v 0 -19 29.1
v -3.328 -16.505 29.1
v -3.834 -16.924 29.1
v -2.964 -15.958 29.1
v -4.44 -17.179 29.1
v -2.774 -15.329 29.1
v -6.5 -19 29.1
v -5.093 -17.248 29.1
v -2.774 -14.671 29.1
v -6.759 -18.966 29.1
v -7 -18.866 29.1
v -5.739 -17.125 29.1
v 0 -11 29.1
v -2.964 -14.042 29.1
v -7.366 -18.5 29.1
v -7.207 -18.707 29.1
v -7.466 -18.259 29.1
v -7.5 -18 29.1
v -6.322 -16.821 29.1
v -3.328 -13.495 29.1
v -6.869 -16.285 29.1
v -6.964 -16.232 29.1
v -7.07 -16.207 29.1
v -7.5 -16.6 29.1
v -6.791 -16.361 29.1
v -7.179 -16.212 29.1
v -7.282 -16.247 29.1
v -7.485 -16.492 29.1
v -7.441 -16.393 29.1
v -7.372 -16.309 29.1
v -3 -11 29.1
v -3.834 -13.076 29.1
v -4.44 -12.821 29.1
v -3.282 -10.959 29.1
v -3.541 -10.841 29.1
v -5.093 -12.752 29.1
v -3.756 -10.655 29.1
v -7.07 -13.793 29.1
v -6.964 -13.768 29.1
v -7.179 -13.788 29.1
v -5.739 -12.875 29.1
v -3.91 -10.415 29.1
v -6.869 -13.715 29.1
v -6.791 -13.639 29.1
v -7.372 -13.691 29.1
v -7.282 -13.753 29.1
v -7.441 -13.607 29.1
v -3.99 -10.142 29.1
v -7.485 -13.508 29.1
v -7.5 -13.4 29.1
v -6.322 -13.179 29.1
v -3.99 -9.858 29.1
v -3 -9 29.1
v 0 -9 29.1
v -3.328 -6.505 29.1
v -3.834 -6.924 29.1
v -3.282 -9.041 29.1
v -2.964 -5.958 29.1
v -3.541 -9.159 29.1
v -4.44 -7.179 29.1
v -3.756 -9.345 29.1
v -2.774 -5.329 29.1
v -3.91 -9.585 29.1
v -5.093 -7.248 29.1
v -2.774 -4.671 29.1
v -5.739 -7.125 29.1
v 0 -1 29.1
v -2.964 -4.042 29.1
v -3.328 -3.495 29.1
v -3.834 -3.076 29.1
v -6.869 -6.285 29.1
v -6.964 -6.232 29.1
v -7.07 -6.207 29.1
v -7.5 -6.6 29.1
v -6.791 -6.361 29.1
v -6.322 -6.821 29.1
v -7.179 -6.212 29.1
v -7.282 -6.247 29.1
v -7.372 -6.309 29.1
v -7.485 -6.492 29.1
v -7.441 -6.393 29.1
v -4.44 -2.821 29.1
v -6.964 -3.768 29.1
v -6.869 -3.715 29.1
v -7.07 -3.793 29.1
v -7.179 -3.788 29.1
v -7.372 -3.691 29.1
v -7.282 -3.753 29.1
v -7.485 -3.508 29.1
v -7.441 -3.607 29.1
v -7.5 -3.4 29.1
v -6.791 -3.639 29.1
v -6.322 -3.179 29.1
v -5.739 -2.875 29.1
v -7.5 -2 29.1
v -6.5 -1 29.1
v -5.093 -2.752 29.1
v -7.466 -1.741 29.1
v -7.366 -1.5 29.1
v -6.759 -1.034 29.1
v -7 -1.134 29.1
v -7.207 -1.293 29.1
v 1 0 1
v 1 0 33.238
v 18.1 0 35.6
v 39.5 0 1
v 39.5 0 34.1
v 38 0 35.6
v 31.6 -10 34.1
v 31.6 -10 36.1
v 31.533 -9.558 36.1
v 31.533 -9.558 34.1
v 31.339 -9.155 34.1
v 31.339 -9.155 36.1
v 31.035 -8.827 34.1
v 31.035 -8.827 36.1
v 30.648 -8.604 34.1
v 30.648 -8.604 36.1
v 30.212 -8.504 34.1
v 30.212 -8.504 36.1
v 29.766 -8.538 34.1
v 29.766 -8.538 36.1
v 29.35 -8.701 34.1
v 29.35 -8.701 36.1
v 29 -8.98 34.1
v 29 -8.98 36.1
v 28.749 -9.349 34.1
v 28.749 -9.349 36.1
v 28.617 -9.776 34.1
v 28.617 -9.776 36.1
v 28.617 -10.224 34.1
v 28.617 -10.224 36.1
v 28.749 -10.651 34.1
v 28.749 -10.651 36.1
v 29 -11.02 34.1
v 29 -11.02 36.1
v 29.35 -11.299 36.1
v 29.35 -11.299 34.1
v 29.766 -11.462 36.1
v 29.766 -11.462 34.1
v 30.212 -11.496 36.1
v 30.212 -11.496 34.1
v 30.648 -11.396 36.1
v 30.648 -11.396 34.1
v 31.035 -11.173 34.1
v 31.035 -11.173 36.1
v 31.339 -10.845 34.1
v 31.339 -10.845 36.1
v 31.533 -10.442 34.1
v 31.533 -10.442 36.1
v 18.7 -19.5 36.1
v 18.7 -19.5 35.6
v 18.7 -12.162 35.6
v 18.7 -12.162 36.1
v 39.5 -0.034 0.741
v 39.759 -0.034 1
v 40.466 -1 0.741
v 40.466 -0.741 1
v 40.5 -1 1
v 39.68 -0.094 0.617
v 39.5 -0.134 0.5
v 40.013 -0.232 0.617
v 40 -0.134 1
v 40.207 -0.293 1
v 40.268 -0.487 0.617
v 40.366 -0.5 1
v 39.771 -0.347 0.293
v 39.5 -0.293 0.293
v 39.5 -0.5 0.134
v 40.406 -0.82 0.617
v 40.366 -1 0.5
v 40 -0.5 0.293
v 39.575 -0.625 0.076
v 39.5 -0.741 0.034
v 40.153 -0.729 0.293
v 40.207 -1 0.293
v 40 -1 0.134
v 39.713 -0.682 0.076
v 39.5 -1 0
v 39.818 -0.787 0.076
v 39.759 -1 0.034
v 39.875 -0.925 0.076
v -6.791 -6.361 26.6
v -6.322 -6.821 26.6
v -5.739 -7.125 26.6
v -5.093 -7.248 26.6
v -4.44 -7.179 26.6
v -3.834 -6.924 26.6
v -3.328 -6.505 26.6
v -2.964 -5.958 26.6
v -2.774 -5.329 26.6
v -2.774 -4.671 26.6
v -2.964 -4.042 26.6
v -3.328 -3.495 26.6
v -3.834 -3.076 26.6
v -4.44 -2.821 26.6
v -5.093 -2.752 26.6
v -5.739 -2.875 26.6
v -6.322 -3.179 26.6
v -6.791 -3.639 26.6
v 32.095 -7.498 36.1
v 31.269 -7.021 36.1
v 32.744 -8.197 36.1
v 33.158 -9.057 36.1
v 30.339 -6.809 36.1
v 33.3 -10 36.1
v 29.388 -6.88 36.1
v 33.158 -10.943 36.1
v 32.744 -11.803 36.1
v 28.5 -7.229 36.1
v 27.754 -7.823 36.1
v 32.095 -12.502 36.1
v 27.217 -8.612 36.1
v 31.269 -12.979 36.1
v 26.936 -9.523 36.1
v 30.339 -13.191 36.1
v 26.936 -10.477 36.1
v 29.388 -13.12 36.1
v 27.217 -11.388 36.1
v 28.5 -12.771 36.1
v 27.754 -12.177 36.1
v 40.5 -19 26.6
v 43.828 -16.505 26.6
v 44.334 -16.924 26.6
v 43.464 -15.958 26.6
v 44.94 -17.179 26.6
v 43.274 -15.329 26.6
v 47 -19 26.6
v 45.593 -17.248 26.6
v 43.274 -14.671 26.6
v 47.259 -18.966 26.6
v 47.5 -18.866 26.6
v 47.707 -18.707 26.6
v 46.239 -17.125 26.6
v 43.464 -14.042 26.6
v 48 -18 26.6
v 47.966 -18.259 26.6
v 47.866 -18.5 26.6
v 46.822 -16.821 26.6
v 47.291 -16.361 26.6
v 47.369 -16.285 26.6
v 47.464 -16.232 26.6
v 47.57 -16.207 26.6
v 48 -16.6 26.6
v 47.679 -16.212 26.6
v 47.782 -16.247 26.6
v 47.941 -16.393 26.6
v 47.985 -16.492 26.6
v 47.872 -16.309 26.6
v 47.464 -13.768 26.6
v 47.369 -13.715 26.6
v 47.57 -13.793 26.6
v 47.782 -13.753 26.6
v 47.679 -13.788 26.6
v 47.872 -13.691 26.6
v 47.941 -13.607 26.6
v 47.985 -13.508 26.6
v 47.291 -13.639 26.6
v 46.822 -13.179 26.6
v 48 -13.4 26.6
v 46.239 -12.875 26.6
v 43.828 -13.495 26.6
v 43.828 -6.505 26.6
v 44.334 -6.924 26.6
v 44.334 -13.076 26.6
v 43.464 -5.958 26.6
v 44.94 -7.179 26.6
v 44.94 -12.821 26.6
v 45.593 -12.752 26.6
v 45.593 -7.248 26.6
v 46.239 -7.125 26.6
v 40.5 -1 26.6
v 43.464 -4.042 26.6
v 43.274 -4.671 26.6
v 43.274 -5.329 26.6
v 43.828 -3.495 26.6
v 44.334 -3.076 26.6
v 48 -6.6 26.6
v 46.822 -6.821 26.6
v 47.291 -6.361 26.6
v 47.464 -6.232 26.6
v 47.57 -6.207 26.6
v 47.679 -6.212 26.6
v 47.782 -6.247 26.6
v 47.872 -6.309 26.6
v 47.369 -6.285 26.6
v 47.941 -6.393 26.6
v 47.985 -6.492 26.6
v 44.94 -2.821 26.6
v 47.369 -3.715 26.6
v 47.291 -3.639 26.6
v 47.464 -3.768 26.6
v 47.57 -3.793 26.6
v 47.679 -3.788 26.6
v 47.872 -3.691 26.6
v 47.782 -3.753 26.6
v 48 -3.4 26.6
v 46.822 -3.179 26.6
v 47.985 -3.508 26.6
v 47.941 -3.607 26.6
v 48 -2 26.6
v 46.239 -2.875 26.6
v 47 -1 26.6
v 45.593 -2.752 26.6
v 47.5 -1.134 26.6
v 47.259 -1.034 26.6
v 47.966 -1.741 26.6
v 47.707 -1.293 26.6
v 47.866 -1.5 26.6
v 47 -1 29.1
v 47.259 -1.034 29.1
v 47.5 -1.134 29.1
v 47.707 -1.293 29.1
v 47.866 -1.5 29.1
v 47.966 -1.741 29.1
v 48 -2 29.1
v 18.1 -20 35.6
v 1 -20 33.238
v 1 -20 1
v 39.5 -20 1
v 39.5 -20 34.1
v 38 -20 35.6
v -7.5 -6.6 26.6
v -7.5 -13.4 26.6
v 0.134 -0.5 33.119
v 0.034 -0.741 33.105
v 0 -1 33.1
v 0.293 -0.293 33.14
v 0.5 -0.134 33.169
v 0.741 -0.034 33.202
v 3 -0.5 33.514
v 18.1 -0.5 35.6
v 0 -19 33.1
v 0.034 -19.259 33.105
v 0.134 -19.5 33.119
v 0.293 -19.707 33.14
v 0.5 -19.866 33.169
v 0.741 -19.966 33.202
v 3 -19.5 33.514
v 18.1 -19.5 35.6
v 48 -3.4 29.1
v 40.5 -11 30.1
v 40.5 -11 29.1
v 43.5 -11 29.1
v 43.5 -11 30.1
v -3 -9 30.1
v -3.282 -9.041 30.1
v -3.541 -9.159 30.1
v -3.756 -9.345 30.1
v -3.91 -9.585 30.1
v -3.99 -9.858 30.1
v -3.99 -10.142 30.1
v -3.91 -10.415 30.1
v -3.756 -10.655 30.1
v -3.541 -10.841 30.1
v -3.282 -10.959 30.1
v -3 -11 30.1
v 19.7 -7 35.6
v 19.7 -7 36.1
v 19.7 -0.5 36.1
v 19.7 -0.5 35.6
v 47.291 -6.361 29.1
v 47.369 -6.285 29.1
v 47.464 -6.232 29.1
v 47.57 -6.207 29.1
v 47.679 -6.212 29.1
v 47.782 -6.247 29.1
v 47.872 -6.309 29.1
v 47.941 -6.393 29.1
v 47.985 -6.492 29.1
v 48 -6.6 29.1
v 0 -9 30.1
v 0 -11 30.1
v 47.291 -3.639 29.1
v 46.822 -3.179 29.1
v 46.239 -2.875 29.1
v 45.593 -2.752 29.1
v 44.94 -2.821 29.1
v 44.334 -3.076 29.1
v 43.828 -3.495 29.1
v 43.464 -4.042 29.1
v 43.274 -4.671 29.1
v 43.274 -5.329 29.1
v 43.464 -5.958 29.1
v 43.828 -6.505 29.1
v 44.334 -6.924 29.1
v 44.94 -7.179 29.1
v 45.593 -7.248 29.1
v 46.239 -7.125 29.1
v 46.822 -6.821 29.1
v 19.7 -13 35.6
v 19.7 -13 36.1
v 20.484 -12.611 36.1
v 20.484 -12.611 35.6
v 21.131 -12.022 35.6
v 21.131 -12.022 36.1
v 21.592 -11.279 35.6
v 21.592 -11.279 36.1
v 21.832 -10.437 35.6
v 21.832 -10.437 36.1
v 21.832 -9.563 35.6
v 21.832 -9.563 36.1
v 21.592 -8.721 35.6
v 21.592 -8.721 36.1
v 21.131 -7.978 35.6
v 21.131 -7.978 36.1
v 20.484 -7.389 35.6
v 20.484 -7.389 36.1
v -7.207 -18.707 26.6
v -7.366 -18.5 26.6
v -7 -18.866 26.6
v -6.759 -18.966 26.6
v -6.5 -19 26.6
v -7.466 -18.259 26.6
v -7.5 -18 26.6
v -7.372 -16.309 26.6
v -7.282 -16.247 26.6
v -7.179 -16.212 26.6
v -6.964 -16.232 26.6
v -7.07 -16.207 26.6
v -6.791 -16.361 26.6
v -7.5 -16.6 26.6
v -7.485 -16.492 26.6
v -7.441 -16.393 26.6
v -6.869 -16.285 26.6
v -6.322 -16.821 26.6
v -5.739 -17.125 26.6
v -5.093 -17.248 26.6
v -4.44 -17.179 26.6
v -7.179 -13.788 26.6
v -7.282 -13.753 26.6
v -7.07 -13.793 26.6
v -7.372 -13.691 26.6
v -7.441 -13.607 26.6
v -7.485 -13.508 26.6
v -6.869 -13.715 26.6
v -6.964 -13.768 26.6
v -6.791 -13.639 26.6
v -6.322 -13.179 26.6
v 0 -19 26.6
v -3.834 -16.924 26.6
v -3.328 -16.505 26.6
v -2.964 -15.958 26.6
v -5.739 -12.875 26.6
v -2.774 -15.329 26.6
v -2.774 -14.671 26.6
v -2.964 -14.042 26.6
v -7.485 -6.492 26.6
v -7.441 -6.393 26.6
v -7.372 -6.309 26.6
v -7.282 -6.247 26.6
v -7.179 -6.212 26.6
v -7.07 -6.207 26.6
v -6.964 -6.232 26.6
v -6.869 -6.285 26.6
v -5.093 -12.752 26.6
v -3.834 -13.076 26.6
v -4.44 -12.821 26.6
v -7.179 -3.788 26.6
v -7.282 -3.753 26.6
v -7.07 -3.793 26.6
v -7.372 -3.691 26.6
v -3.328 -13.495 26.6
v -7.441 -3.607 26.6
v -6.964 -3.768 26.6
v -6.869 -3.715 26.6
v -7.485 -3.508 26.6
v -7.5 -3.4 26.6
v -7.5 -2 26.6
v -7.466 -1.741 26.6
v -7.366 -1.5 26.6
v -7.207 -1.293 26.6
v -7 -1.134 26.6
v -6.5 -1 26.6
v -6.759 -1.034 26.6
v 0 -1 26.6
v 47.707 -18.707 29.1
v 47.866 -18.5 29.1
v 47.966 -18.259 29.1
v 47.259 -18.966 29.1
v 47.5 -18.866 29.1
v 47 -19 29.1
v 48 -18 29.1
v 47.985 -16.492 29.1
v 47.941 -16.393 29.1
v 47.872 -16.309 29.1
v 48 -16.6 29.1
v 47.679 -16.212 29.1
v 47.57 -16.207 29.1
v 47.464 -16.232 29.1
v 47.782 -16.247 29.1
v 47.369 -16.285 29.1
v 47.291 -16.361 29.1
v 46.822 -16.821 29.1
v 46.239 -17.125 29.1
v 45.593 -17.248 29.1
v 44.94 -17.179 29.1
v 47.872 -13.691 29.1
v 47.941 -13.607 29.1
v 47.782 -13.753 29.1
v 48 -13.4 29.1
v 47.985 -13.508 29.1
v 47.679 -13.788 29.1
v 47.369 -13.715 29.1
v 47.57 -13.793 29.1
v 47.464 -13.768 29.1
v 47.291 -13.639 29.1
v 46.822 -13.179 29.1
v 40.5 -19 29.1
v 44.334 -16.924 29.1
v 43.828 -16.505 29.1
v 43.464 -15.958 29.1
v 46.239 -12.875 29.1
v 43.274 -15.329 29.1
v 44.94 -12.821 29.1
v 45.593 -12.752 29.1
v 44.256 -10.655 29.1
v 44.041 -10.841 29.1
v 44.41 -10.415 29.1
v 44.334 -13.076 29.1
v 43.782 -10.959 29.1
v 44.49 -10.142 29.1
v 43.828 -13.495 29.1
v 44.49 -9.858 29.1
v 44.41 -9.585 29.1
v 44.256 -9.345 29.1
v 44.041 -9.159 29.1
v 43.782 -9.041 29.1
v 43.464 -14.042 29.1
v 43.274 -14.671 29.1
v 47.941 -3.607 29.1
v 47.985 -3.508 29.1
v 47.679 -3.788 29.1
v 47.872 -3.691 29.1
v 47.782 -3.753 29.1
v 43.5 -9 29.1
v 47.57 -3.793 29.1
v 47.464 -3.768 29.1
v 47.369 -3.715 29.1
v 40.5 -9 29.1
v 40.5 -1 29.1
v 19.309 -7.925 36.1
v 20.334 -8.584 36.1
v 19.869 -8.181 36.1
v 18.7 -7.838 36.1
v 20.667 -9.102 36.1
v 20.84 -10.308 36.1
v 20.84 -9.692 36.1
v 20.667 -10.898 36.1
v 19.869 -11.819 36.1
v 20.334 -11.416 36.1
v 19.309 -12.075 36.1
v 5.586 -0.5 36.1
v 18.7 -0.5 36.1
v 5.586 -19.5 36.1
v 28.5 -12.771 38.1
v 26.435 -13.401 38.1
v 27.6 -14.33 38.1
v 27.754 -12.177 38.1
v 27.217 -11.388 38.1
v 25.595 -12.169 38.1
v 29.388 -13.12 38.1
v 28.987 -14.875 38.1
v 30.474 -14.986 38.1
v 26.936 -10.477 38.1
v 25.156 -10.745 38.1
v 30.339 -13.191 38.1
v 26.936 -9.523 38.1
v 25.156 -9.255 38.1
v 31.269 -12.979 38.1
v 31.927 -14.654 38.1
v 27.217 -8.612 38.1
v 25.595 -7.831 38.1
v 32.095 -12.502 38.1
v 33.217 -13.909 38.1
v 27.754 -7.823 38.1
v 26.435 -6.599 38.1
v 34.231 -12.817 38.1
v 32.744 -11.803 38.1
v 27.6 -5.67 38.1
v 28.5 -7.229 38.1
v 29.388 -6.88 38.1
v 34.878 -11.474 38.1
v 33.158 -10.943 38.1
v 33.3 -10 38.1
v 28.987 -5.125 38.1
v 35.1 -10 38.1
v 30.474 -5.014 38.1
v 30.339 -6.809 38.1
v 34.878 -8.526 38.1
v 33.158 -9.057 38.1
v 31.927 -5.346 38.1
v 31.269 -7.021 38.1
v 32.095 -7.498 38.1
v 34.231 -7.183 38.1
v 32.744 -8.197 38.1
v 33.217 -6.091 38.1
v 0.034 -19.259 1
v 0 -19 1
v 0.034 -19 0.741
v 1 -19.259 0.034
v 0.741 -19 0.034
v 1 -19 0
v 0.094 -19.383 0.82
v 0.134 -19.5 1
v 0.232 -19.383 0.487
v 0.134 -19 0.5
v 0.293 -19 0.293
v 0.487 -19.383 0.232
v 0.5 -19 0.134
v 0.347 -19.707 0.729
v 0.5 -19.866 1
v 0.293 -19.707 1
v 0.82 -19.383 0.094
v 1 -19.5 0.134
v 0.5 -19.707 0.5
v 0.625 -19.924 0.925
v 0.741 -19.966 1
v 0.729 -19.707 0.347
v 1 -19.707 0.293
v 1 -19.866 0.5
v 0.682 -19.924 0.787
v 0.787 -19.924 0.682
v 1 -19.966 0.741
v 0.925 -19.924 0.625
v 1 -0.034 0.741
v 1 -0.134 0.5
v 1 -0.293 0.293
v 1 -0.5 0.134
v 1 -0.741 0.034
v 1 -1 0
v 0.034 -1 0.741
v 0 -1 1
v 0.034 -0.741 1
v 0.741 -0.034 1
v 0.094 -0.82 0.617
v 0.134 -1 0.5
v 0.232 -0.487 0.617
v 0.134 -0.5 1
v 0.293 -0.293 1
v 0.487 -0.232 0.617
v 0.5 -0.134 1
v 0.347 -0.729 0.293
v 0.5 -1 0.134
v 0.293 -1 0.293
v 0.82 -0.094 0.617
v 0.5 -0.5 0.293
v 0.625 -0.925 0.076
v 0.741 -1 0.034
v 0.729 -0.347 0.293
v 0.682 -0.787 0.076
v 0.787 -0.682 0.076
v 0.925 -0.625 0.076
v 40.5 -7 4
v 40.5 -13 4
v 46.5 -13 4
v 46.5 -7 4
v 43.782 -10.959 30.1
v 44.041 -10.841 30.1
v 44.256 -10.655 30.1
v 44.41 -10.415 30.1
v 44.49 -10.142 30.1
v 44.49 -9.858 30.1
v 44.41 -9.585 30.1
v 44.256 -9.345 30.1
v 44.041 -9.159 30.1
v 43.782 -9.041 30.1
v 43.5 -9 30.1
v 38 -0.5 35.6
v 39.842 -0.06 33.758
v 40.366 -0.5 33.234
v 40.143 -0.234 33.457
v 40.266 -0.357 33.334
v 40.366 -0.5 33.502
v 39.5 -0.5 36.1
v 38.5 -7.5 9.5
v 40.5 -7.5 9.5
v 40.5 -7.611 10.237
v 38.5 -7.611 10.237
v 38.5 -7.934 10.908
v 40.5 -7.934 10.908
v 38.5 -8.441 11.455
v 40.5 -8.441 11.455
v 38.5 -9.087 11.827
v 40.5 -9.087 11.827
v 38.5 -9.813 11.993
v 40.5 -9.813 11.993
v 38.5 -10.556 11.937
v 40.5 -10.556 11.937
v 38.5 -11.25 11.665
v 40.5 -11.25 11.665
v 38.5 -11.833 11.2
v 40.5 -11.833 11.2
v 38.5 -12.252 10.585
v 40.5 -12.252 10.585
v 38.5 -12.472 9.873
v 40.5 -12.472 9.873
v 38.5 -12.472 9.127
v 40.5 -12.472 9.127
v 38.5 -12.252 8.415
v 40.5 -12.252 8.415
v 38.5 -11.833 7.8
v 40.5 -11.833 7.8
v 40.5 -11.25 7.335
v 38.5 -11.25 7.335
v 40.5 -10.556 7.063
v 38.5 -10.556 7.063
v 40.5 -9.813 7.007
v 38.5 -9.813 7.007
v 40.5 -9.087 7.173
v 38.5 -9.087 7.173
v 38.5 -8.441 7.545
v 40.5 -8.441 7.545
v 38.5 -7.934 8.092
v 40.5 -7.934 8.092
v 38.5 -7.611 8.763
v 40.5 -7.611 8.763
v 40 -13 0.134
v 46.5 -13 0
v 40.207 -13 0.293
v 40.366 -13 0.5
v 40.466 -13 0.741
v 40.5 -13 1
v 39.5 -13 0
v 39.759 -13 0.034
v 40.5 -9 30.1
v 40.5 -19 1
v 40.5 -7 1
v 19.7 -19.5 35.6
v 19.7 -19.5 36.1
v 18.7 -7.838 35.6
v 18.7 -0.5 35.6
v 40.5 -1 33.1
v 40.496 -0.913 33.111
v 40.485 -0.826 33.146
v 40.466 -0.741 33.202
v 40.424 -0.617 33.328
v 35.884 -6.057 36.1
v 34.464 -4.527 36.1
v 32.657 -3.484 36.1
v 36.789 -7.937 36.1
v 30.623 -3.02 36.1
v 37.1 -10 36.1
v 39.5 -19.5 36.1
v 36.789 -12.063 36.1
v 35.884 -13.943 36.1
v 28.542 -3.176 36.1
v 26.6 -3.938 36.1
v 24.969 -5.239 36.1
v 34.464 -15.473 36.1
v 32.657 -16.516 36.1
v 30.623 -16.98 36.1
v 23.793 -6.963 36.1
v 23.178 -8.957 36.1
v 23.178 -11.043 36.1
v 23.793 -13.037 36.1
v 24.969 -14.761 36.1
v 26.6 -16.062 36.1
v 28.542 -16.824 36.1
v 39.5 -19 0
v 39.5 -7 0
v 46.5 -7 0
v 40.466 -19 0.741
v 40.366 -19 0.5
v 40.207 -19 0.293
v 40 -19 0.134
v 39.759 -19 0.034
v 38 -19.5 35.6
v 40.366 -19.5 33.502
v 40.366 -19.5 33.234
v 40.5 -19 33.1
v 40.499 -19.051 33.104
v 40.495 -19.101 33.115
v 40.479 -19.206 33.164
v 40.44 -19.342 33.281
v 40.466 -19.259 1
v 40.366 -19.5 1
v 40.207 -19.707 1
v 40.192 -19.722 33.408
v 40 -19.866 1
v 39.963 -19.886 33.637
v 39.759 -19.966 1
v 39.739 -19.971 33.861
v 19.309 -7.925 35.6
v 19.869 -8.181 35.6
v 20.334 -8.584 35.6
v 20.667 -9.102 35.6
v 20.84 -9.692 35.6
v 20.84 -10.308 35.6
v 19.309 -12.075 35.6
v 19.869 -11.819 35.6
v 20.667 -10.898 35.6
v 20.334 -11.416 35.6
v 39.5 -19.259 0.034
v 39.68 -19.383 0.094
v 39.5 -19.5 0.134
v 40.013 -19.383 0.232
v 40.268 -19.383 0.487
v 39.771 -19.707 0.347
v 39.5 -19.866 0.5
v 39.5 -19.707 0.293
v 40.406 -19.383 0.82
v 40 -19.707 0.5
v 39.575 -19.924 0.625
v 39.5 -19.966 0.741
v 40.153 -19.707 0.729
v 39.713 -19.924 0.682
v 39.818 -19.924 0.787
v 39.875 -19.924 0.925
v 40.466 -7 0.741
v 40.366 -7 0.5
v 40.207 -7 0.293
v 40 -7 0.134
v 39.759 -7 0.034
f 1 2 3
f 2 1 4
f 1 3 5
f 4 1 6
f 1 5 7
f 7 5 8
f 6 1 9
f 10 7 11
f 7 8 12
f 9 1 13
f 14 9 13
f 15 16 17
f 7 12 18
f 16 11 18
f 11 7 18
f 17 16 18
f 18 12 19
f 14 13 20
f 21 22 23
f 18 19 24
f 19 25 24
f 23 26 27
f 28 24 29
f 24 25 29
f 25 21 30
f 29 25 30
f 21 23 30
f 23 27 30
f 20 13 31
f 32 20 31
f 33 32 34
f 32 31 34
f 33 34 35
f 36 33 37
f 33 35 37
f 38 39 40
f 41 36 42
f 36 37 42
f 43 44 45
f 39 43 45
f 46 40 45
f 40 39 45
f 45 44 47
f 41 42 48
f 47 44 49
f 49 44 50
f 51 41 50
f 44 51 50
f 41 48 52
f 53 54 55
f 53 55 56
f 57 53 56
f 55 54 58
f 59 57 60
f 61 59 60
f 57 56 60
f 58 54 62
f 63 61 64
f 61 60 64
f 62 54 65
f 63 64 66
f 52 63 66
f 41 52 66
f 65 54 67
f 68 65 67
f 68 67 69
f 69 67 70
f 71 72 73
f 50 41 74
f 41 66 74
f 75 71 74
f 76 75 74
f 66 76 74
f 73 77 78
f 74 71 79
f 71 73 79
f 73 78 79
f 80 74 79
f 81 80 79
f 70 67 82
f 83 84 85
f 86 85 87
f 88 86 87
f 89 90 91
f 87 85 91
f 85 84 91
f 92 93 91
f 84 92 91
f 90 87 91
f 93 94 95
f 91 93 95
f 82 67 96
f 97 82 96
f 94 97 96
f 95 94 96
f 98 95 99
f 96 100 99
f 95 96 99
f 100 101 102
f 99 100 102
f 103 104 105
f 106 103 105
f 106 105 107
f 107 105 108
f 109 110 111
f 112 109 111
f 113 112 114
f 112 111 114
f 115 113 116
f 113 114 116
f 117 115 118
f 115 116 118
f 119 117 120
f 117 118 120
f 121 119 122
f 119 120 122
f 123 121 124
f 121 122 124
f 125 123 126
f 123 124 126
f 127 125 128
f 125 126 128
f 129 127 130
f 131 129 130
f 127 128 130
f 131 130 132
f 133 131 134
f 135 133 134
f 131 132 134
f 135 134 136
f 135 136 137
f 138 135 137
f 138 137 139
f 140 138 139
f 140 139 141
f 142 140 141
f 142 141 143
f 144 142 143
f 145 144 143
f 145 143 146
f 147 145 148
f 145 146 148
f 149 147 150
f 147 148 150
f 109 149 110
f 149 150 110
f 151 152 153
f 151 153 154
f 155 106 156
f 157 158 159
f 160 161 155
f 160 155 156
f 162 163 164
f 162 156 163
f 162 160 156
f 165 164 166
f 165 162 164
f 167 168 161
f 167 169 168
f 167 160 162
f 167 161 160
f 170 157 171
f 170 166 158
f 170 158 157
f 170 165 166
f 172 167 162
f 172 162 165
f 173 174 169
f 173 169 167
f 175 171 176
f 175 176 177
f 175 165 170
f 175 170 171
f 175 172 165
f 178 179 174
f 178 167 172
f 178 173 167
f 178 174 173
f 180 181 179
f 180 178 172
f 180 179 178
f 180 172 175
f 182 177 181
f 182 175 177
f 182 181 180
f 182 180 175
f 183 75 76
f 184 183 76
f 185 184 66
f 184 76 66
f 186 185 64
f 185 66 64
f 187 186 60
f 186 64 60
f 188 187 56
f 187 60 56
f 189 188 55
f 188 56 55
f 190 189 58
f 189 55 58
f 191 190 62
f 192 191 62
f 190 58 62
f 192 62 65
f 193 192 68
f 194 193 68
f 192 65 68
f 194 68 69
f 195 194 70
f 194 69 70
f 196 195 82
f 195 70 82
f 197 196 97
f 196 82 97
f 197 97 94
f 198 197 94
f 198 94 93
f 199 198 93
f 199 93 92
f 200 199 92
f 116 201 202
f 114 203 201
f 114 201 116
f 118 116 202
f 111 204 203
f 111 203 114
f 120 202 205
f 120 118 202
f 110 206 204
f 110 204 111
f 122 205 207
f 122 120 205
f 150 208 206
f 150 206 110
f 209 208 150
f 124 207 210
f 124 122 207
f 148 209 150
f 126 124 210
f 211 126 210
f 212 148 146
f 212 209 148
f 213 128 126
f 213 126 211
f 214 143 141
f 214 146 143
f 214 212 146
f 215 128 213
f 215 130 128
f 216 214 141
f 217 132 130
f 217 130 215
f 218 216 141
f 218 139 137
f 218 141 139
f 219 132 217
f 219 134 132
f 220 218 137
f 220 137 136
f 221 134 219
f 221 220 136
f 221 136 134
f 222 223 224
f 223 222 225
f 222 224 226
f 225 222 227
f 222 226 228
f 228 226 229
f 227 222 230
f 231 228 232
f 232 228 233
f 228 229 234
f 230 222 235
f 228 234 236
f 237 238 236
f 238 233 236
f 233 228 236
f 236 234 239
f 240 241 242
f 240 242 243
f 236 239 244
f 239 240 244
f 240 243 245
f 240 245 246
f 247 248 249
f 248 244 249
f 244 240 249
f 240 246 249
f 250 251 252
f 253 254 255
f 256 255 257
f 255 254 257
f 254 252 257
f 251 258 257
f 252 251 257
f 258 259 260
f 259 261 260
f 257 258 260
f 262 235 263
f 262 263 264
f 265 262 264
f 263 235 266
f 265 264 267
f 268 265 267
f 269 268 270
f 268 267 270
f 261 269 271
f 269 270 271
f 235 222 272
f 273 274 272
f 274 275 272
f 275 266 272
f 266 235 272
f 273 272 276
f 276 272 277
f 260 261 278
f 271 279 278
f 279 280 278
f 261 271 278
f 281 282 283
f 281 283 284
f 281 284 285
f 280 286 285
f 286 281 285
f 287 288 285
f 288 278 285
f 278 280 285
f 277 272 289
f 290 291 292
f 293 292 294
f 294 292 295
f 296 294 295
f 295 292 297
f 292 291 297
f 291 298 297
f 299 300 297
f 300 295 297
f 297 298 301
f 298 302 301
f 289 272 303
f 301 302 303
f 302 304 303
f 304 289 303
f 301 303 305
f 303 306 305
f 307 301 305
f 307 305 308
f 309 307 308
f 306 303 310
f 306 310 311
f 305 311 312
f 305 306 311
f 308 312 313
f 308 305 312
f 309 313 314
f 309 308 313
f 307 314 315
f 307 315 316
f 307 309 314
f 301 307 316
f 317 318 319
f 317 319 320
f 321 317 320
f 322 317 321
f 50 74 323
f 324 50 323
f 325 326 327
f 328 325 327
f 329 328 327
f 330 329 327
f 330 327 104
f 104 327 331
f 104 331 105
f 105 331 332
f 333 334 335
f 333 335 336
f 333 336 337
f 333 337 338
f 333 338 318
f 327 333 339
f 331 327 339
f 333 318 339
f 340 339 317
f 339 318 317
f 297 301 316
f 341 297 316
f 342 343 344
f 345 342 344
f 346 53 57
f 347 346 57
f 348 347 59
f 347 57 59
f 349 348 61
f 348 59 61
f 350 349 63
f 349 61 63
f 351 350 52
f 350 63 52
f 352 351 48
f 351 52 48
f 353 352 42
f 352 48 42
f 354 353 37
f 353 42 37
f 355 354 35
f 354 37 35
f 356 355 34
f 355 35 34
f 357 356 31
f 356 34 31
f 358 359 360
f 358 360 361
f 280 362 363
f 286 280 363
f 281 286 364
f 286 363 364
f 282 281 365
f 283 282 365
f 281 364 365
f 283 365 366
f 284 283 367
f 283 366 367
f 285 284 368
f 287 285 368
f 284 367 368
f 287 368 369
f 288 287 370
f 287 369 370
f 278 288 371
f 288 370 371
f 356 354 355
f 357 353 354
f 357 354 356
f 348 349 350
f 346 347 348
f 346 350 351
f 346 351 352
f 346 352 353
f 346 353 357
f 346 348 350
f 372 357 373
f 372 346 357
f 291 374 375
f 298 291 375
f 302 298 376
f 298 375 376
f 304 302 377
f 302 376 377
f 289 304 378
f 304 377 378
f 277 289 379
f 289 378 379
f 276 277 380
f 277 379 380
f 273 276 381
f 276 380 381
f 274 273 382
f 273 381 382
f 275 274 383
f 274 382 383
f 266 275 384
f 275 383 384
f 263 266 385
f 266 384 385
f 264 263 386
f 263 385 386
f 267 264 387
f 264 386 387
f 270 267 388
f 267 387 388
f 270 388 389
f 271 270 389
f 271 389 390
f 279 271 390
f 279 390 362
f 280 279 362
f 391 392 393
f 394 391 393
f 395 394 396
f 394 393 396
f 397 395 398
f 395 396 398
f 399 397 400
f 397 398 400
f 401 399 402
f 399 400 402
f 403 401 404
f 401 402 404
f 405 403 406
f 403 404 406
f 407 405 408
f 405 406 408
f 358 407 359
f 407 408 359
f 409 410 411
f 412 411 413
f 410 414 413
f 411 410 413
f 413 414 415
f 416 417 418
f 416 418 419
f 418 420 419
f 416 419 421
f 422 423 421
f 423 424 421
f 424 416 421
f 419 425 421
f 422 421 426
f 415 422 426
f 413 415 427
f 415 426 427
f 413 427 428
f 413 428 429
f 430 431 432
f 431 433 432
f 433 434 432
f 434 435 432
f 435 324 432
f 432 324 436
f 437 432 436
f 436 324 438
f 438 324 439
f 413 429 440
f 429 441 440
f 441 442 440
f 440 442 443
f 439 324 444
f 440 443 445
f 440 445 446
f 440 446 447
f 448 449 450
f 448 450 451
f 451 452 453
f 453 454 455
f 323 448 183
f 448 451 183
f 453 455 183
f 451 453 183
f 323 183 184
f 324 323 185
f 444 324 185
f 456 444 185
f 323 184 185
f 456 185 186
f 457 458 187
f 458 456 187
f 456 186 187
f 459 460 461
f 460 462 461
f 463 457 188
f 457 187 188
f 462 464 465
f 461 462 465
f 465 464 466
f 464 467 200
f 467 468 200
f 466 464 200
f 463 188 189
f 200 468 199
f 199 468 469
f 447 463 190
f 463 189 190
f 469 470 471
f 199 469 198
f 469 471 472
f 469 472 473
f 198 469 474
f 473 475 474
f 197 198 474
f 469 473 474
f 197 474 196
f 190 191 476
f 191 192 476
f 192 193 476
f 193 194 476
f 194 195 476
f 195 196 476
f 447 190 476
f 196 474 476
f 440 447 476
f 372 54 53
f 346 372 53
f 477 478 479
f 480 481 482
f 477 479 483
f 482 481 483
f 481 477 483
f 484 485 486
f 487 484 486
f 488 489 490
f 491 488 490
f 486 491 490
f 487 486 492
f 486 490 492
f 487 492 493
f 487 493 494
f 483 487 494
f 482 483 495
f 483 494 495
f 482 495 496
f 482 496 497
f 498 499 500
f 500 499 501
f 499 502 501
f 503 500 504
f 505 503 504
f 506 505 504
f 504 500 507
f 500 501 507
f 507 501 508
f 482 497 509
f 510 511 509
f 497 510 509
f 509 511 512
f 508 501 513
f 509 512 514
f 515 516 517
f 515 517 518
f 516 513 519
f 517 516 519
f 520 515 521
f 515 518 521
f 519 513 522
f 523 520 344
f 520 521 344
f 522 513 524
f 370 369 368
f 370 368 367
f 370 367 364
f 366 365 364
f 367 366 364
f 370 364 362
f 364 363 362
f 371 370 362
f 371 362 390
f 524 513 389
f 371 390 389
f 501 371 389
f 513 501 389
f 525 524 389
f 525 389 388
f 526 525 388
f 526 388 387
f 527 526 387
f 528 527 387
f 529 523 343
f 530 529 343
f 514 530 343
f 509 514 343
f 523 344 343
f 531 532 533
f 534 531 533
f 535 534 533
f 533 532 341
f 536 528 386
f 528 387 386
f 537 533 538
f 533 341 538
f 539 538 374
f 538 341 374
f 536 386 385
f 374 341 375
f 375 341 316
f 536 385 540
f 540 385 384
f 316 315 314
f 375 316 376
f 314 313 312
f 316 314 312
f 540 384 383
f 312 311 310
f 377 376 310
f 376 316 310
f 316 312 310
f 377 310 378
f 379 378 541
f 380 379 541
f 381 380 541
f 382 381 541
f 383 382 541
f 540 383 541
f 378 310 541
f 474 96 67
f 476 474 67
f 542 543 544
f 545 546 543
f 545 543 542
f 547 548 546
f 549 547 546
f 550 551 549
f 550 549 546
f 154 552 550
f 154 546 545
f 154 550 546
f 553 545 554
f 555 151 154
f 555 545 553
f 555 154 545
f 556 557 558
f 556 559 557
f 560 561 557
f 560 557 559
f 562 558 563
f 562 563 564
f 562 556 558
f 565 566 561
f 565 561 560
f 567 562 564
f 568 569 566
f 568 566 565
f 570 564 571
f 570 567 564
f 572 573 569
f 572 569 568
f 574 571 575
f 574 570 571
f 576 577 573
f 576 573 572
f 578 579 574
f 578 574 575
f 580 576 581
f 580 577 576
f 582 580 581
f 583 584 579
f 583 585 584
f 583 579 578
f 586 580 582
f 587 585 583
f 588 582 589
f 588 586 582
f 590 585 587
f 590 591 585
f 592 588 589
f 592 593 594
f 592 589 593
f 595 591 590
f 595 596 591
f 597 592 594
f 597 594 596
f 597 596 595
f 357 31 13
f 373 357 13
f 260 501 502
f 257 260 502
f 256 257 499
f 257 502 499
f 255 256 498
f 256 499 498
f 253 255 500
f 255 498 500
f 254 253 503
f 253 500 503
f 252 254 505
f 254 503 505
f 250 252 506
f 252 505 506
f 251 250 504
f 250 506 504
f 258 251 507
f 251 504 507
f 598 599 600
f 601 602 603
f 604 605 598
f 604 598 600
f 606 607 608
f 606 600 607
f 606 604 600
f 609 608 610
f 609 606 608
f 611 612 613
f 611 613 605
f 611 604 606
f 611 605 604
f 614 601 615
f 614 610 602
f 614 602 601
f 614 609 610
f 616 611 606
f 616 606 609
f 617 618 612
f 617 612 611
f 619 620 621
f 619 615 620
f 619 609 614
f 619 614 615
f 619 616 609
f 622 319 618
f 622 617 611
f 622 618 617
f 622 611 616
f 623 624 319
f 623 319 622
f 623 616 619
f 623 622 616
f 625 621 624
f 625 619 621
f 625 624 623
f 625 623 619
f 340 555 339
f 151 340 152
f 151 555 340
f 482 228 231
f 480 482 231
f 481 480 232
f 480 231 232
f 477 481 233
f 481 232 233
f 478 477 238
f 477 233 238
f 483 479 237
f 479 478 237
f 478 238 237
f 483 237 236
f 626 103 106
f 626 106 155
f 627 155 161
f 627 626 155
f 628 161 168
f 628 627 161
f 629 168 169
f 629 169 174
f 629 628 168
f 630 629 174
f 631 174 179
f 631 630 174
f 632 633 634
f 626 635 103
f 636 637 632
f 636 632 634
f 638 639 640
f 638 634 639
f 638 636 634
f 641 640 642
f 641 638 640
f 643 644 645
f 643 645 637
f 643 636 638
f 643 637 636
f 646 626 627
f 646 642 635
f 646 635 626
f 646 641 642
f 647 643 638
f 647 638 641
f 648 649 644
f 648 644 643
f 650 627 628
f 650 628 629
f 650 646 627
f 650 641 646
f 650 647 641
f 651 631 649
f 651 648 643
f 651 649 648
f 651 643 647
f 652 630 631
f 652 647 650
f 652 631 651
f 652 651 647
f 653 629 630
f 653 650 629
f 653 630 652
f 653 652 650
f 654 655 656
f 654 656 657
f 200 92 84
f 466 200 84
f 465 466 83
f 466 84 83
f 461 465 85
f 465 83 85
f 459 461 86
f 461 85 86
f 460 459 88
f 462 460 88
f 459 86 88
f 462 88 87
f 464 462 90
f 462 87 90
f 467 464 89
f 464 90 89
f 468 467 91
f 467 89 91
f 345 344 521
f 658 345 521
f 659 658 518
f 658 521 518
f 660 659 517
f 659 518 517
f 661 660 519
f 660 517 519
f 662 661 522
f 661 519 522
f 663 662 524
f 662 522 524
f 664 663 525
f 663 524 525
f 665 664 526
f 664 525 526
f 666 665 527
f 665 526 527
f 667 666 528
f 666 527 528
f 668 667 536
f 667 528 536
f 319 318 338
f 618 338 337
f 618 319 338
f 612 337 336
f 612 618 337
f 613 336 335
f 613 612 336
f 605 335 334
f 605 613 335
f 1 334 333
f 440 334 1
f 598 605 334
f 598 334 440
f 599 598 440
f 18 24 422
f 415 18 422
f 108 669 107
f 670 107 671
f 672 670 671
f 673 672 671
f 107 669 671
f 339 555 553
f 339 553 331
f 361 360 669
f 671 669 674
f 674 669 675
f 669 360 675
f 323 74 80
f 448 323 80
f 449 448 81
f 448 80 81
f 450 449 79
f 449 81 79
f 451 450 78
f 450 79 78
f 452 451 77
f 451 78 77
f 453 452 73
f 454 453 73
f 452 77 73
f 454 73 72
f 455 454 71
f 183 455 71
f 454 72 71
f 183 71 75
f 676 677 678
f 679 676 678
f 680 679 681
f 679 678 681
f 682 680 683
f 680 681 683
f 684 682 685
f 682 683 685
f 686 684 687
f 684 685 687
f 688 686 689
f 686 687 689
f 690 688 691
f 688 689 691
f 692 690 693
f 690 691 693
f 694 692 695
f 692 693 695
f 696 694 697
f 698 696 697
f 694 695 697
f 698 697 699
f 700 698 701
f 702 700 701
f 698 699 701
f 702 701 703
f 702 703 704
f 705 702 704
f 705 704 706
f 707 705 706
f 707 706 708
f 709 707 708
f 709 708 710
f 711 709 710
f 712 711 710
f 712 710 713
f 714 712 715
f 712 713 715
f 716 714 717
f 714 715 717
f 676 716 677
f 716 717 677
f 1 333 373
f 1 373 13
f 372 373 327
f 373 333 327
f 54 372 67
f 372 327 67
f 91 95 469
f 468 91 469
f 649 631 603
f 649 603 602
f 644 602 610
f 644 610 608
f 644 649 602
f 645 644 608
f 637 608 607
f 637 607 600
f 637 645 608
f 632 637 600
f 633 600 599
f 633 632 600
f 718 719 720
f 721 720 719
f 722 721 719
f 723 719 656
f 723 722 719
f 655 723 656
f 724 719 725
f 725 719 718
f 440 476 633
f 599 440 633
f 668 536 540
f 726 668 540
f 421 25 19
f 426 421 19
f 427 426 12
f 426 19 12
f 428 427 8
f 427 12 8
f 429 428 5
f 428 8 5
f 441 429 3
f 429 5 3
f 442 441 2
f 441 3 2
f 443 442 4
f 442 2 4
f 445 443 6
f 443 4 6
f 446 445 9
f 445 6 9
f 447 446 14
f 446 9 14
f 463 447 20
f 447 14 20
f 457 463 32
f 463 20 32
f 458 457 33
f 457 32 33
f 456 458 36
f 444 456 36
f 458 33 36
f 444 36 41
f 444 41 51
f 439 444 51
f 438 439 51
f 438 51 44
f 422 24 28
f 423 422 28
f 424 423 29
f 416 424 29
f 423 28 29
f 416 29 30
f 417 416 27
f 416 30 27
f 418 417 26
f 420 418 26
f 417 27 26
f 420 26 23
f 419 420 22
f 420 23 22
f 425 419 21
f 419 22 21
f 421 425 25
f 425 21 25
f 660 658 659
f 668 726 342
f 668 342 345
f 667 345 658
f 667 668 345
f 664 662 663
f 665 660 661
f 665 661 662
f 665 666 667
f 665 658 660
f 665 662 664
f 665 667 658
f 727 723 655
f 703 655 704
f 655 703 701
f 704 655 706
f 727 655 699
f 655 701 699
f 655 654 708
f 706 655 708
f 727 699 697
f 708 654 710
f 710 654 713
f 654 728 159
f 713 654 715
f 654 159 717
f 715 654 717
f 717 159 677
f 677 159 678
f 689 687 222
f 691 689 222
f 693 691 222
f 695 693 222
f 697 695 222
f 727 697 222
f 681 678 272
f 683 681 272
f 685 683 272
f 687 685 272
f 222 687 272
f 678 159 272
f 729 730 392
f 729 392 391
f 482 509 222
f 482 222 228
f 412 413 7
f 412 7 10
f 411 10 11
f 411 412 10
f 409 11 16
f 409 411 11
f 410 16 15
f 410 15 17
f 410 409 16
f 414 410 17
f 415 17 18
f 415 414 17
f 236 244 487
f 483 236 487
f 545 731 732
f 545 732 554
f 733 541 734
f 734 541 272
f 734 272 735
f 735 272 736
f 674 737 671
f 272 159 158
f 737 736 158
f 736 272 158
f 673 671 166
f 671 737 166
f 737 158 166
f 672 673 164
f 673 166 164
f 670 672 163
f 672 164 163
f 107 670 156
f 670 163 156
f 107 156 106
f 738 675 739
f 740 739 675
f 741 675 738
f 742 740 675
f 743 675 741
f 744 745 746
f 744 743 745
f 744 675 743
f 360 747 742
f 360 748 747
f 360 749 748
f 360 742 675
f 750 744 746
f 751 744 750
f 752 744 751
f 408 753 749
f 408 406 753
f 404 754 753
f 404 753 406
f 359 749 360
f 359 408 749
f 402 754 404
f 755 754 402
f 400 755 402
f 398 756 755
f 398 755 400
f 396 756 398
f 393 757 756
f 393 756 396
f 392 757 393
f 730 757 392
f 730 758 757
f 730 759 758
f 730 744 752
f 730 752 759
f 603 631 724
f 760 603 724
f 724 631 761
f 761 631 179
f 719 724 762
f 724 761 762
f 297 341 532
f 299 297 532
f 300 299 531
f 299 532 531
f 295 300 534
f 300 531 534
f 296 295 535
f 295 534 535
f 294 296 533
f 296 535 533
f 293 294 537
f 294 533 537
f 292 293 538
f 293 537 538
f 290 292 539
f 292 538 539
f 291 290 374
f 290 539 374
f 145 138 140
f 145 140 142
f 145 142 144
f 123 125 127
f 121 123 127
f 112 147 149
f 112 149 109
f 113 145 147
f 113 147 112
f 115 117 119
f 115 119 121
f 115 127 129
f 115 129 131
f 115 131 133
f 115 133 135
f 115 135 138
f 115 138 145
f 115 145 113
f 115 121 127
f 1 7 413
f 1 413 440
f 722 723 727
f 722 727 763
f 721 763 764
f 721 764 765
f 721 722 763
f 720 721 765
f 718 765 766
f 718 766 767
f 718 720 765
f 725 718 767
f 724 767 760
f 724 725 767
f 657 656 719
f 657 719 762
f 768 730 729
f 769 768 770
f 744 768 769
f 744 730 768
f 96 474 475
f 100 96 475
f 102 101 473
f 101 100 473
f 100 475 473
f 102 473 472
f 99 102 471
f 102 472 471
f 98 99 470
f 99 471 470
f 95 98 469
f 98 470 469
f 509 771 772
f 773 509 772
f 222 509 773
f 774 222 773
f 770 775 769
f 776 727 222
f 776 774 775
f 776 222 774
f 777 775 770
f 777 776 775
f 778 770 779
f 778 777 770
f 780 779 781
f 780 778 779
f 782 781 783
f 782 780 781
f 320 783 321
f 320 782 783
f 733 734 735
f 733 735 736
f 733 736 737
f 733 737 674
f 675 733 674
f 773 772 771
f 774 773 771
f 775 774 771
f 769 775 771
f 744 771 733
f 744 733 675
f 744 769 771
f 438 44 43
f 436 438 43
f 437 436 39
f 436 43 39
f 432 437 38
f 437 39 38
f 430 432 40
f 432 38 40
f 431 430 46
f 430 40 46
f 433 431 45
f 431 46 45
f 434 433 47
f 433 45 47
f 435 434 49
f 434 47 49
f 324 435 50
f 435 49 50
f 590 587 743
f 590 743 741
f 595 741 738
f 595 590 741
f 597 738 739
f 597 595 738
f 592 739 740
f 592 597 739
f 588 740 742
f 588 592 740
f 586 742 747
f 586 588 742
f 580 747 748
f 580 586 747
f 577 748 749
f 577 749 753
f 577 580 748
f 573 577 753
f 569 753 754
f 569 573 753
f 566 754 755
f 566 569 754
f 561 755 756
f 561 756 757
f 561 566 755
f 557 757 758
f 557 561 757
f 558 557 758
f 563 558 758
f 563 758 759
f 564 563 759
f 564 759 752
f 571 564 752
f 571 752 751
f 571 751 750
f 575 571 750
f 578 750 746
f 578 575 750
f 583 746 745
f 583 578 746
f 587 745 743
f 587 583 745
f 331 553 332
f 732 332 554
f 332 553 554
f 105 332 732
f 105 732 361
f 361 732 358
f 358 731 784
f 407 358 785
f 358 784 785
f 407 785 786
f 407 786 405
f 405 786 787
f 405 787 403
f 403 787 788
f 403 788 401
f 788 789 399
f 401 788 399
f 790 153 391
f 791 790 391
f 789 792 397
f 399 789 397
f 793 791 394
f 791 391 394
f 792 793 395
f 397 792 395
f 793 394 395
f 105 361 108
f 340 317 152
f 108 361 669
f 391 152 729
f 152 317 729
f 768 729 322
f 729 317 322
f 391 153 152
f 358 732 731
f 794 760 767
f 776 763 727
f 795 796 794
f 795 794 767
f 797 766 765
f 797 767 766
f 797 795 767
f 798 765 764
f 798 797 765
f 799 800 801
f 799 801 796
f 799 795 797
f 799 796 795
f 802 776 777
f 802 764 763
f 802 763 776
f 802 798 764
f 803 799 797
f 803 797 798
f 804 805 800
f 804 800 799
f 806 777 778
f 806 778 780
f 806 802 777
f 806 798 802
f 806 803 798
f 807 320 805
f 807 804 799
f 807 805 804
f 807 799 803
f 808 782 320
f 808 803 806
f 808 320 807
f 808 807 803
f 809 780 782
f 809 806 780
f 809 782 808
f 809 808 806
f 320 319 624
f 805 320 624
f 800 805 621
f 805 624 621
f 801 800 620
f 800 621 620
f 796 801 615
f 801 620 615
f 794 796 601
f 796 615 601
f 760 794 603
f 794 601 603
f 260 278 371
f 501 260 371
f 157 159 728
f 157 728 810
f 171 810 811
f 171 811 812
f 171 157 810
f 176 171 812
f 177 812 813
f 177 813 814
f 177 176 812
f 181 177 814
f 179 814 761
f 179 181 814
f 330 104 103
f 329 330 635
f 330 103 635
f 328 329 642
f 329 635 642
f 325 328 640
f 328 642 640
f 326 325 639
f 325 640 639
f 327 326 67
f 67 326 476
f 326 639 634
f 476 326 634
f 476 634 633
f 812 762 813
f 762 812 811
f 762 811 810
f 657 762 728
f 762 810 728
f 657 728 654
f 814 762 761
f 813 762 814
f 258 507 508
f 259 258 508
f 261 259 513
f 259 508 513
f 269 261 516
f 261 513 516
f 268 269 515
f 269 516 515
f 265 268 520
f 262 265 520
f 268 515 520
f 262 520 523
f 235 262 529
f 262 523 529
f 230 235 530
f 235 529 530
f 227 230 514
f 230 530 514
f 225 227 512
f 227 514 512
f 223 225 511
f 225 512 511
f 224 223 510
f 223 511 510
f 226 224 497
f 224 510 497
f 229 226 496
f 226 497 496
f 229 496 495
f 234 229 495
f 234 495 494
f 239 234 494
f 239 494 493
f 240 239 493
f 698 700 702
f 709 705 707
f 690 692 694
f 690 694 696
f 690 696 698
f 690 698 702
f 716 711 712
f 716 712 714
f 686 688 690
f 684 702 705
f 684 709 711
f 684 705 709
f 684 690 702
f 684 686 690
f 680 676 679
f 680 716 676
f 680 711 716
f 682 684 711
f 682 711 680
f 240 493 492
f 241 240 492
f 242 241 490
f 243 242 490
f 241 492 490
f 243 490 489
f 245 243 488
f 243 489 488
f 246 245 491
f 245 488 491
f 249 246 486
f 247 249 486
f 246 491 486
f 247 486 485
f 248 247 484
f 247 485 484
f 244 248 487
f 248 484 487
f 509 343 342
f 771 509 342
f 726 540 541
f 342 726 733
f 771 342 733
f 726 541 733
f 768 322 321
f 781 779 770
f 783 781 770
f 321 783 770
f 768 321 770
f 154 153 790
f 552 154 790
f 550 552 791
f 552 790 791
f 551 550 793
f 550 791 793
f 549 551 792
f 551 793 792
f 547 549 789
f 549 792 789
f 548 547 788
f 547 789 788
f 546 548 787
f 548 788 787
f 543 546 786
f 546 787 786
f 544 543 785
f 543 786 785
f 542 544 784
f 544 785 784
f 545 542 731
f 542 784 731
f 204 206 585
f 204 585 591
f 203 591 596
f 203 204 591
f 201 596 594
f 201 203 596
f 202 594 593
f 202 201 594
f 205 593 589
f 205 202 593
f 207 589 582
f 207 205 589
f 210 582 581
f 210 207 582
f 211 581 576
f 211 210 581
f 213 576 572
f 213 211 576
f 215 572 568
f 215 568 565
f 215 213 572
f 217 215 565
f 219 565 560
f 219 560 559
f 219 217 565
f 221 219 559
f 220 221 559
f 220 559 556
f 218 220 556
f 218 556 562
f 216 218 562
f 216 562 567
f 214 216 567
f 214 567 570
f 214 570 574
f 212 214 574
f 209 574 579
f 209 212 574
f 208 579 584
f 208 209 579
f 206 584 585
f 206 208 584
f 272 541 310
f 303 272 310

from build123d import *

# Parameters (mm, degrees)
F1_DEPTH      = 20
F2_W          = 7.5
F2_H          = 1
F3_DEPTH      = 2.5
F5_DEPTH      = 1
F7_DEPTH      = 20
F10_DEPTH     = 19
F12_DEPTH     = 0.5
F14_DEPTH     = 0.5
F15_R         = 7
F15_R_2       = 3.2
F16_DEPTH     = 2
F17_SIZE      = 1.99999
F18_R         = 1.5
F19_DEPTH     = 2
F20_R         = 2.5
F21_DEPTH     = 2
F22_W         = 6
F22_H         = 4
F23_DEPTH     = 6
F24_T1_DEPTH  = 34.6
F24_T3_DEPTH  = 7.5
F24_T5_DEPTH  = 38.5
F24_T7_DEPTH  = 18
F24_T9_DEPTH  = 6
F24_T11_DEPTH = 6
F24_S15_W     = 1
F24_S15_H     = 1
F24_T16_DEPTH = 1
F24_S21_W     = 1
F24_S21_H     = 1
F24_T22_DEPTH = 1
F24_S27_W     = 1
F24_S27_H     = 1
F24_T28_DEPTH = 1
F24_S33_W     = 1
F24_S33_H     = 1
F24_T34_DEPTH = 1


# Not quite as in the source:
# - a fillet or chamfer that OpenCascade refuses, or shapes differently, is made with other operations: its cross-section is extruded or revolved along the edge and cut away or added
# - a fillet or chamfer is up to 0.001 mm smaller than in the source, because OpenCascade refuses the exact size


with BuildPart() as f1:
    # F0 (on Front) → F1 (new body)
    with BuildSketch(Plane.XZ):
        Polygon((0, 26.6), (0, 0), (40.5, 0), (40.5, 26.6), (48, 26.6), (48, 29.1), (40.5, 29.1), (40.5, 36.1), (0, 36.1), (0, 29.1), (-7.5, 29.1), (-7.5, 26.6), align=None)
    extrude(amount=F1_DEPTH)

    # F2 (on face) → F3 (cut, through all)
    with BuildSketch(Plane.XY.offset(29.1)):
        with Locations((-3.75, -0.5)):
            Rectangle(F2_W, F2_H)
        with Locations((-3.75, -19.5)):
            Rectangle(F2_W, F2_H)
        with BuildLine():
            ThreePointArc((-7.5, -6.6), (-7.2314497593, -6.2261647771), (-6.7914469101, -6.3613294855))
            ThreePointArc((-6.7914469101, -6.3613294855), (-2.75, -5), (-6.7914469101, -3.6386705145))
            ThreePointArc((-6.7914469101, -3.6386705145), (-7.2314497593, -3.7738352229), (-7.5, -3.4))
            Line((-7.5, -3.4), (-7.5, -6.6))
        make_face()
        with BuildLine():
            ThreePointArc((-7.5, -16.6), (-7.2314497593, -16.2261647771), (-6.7914469101, -16.3613294855))
            ThreePointArc((-6.7914469101, -16.3613294855), (-2.75, -15), (-6.7914469101, -13.6386705145))
            ThreePointArc((-6.7914469101, -13.6386705145), (-7.2314497593, -13.7738352229), (-7.5, -13.4))
            Line((-7.5, -13.4), (-7.5, -16.6))
        make_face()
        with BuildLine():
            Line((48, -16.6), (48, -13.4))
            ThreePointArc((48, -13.4), (47.7314497593, -13.7738352229), (47.2914469101, -13.6386705145))
            ThreePointArc((47.2914469101, -13.6386705145), (43.25, -15), (47.2914469101, -16.3613294855))
            ThreePointArc((47.2914469101, -16.3613294855), (47.7314497593, -16.2261647771), (48, -16.6))
        make_face()
        with Locations((44.25, -0.5)):
            Rectangle(F2_W, F2_H)
        with BuildLine():
            ThreePointArc((47.2914469101, -3.6386705145), (43.25, -5), (47.2914469101, -6.3613294855))
            ThreePointArc((47.2914469101, -6.3613294855), (47.7314497593, -6.2261647771), (48, -6.6))
            Line((48, -6.6), (48, -3.4))
            ThreePointArc((48, -3.4), (47.7314497593, -3.7738352229), (47.2914469101, -3.6386705145))
        make_face()
        with Locations((44.25, -19.5)):
            Rectangle(F2_W, F2_H)
    extrude(amount=-F3_DEPTH, mode=Mode.SUBTRACT)

    # F4 (on face) → F5 (join)
    with BuildSketch(Plane.XY.offset(29.1)):
        with BuildLine():
            Line((0, -11), (0, -9))
            Line((0, -9), (-3, -9))
            ThreePointArc((-3, -9), (-4, -10), (-3, -11))
            Line((-3, -11), (0, -11))
        make_face()
        with BuildLine():
            Line((43.5, -9), (40.5, -9))
            Line((40.5, -9), (40.5, -11))
            Line((40.5, -11), (43.5, -11))
            ThreePointArc((43.5, -11), (44.5, -10), (43.5, -9))
        make_face()
    extrude(amount=F5_DEPTH)

    # F6 (on face) → F7 (cut, through all)
    with BuildSketch(Plane.XZ.offset(20)):
        Polygon((40.5, 36.1), (0, 36.1), (0, 33.1), (18.1, 35.6), (38, 35.6), (40.5, 33.1), align=None)
    extrude(amount=-F7_DEPTH, mode=Mode.SUBTRACT)

    # F9 (on offset) → F10 (join)
    with BuildSketch(Plane.XZ.offset(19.5)):
        Polygon((5.5856353591, 36.1), (3, 33.5143646409), (18.1, 35.6), (18.7, 35.6), (18.7, 36.1), align=None)
        Polygon((39.5, 36.1), (19.7, 36.1), (19.7, 35.6), (38, 35.6), (40.5, 33.1), align=None)
    extrude(amount=-F10_DEPTH)

    # F11 (on face) → F12 (cut, through all)
    with BuildSketch(Plane.XY.offset(36.1)):
        with BuildLine():
            Line((19.7, -7), (19.7, -13))
            ThreePointArc((19.7, -13), (21.8622776602, -10), (19.7, -7))
        make_face()
    extrude(amount=-F12_DEPTH, mode=Mode.SUBTRACT)

    # F13 (on face) → F14 (join)
    with BuildSketch(Plane.XY.offset(35.6)):
        with BuildLine():
            Line((18.7, -7.8377223398), (18.7, -12.1622776602))
            ThreePointArc((18.7, -12.1622776602), (20.8622776602, -10), (18.7, -7.8377223398))
        make_face()
    extrude(amount=F14_DEPTH)

    # F15 (on face) → F16 (join)
    with BuildSketch(Plane.XY.offset(36.1)):
        with Locations((30.1, -10)):
            Circle(F15_R)
        with Locations((30.1, -10)):
            Circle(F15_R_2, mode=Mode.SUBTRACT)
    extrude(amount=F16_DEPTH)

    # F17 (size 2 in the source; OpenCascade refuses exactly that, so slightly less here)
    f17_edges = [f1.edges().sort_by_distance(p)[0] for p in [
        (23.1, -10, 38.1),
    ]]
    chamfer(f17_edges, length=F17_SIZE)

    # F18 (on face) → F19 (cut)
    with BuildSketch(Plane.XY.offset(36.1)):
        with Locations((30.1, -10)):
            Circle(F18_R)
    extrude(amount=-F19_DEPTH, mode=Mode.SUBTRACT)

    # F20 (on face) → F21 (cut)
    with BuildSketch(Plane.YZ.offset(40.5)):
        with Locations((-10, 9.5)):
            Circle(F20_R)
    extrude(amount=-F21_DEPTH, mode=Mode.SUBTRACT)

    # F22 (on face) → F23 (join)
    with BuildSketch(Plane.YZ.offset(40.5)):
        with Locations((-10, 2)):
            Rectangle(F22_W, F22_H)
    extrude(amount=F23_DEPTH)

    # F24: fillet of radius 1 on 13 edges, made by hand

    # F24_s2 → F24_t1 (cut)
    with BuildSketch(Plane.XY.offset(1)):
        with BuildLine():
            ThreePointArc((1, 0), (0.2928932188, -0.2928932188), (0, -1))
            Line((0, -1), (0, 0))
            Line((0, 0), (1, 0))
        make_face()
        with BuildLine():
            ThreePointArc((1, -20), (0.2928932188, -19.7071067812), (0, -19))
            Line((0, -19), (0, -20))
            Line((0, -20), (1, -20))
        make_face()
        with BuildLine():
            ThreePointArc((40.5, -19), (40.2071067812, -19.7071067812), (39.5, -20))
            Line((39.5, -20), (40.5, -20))
            Line((40.5, -20), (40.5, -19))
        make_face()
        with BuildLine():
            ThreePointArc((40.5, -1), (40.2071067812, -0.2928932188), (39.5, 0))
            Line((39.5, 0), (40.5, 0))
            Line((40.5, 0), (40.5, -1))
        make_face()
    extrude(amount=F24_T1_DEPTH, mode=Mode.SUBTRACT)

    # F24_s4 → F24_t3 (cut)
    with BuildSketch(Plane.XY.offset(24.1)):
        with BuildLine():
            ThreePointArc((-6.5, -19), (-7.2071067812, -18.7071067812), (-7.5, -18))
            Line((-7.5, -18), (-7.5, -19))
            Line((-7.5, -19), (-6.5, -19))
        make_face()
        with BuildLine():
            ThreePointArc((-6.5, -1), (-7.2071067812, -1.2928932188), (-7.5, -2))
            Line((-7.5, -2), (-7.5, -1))
            Line((-7.5, -1), (-6.5, -1))
        make_face()
        with BuildLine():
            ThreePointArc((47, -1), (47.7071067812, -1.2928932188), (48, -2))
            Line((48, -2), (48, -1))
            Line((48, -1), (47, -1))
        make_face()
        with BuildLine():
            ThreePointArc((47, -19), (47.7071067812, -18.7071067812), (48, -18))
            Line((48, -18), (48, -19))
            Line((48, -19), (47, -19))
        make_face()
    extrude(amount=F24_T3_DEPTH, mode=Mode.SUBTRACT)

    # F24_s6 → F24_t5 (cut)
    with BuildSketch(Plane.YZ.offset(1)):
        with BuildLine():
            ThreePointArc((-20, 1), (-19.7071067812, 0.2928932188), (-19, 0))
            Line((-19, 0), (-20, 0))
            Line((-20, 0), (-20, 1))
        make_face()
        with BuildLine():
            ThreePointArc((0, 1), (-0.2928932188, 0.2928932188), (-1, 0))
            Line((-1, 0), (0, 0))
            Line((0, 0), (0, 1))
        make_face()
    extrude(amount=F24_T5_DEPTH, mode=Mode.SUBTRACT)

    # F24_s8 → F24_t7 (cut)
    with BuildSketch(Plane.XZ.offset(1)):
        with BuildLine():
            ThreePointArc((1, 0), (0.2928932188, 0.2928932188), (0, 1))
            Line((0, 1), (0, 0))
            Line((0, 0), (1, 0))
        make_face()
    extrude(amount=F24_T7_DEPTH, mode=Mode.SUBTRACT)

    # F24_s10 → F24_t9 (cut)
    with BuildSketch(Plane.XZ.offset(13)):
        with BuildLine():
            ThreePointArc((40.5, 1), (40.2071067812, 0.2928932188), (39.5, 0))
            Line((39.5, 0), (40.5, 0))
            Line((40.5, 0), (40.5, 1))
        make_face()
    extrude(amount=F24_T9_DEPTH, mode=Mode.SUBTRACT)

    # F24_s12 → F24_t11 (cut)
    with BuildSketch(Plane.XZ.offset(1)):
        with BuildLine():
            ThreePointArc((40.5, 1), (40.2071067812, 0.2928932188), (39.5, 0))
            Line((39.5, 0), (40.5, 0))
            Line((40.5, 0), (40.5, 1))
        make_face()
    extrude(amount=F24_T11_DEPTH, mode=Mode.SUBTRACT)


with BuildPart() as f24_tool14:
    # F24_s15 → F24_t16 (new body)
    with BuildSketch(Plane.XY.offset(1)):
        with Locations((0.5, -0.5)):
            Rectangle(F24_S15_W, F24_S15_H)
    extrude(amount=-F24_T16_DEPTH)

    # F24_s17 → F24_t18 (revolve, cut)
    with BuildSketch(Plane(origin=(1, -1, 1), x_dir=(0.7071067812, -0.7071067812, 0), z_dir=(0.7071067812, 0.7071067812, 0))):
        with BuildLine():
            ThreePointArc((0, -1), (1, 0), (0, 1))
            Line((0, 1), (0, -1))
        make_face()
    revolve(axis=Axis((1, -1, 1), (0, 0, -1)), mode=Mode.SUBTRACT)


with BuildPart() as f1_1:
    add(f1.part)

    # F24_t13: cut F24_tool14
    add(f24_tool14.part, mode=Mode.SUBTRACT)


with BuildPart() as f24_tool20:
    # F24_s21 → F24_t22 (new body)
    with BuildSketch(Plane.XZ.offset(19)):
        with Locations((0.5, 0.5)):
            Rectangle(F24_S21_W, F24_S21_H)
    extrude(amount=F24_T22_DEPTH)

    # F24_s23 → F24_t24 (revolve, cut)
    with BuildSketch(Plane(origin=(1, -19, 1), x_dir=(0.7071067812, 0, 0.7071067812), z_dir=(0.7071067812, 0, -0.7071067812))):
        with BuildLine():
            ThreePointArc((0, -1), (1, 0), (0, 1))
            Line((0, 1), (0, -1))
        make_face()
    revolve(axis=Axis((1, -19, 1), (0, -1, 0)), mode=Mode.SUBTRACT)


with BuildPart() as f1_2:
    add(f1_1.part)

    # F24_t19: cut F24_tool20
    add(f24_tool20.part, mode=Mode.SUBTRACT)


with BuildPart() as f24_tool26:
    # F24_s27 → F24_t28 (new body)
    with BuildSketch(Plane.XZ.offset(19)):
        with Locations((40, 0.5)):
            Rectangle(F24_S27_W, F24_S27_H)
    extrude(amount=F24_T28_DEPTH)

    # F24_s29 → F24_t30 (revolve, cut)
    with BuildSketch(Plane(origin=(39.5, -19, 1), x_dir=(-0.7071067812, 0, 0.7071067812), z_dir=(0.7071067812, 0, 0.7071067812))):
        with BuildLine():
            ThreePointArc((0, -1), (1, 0), (0, 1))
            Line((0, 1), (0, -1))
        make_face()
    revolve(axis=Axis((39.5, -19, 1), (0, -1, 0)), mode=Mode.SUBTRACT)


with BuildPart() as f1_3:
    add(f1_2.part)

    # F24_t25: cut F24_tool26
    add(f24_tool26.part, mode=Mode.SUBTRACT)


with BuildPart() as f24_tool32:
    # F24_s33 → F24_t34 (new body)
    with BuildSketch(Plane.XY.offset(1)):
        with Locations((40, -0.5)):
            Rectangle(F24_S33_W, F24_S33_H)
    extrude(amount=-F24_T34_DEPTH)

    # F24_s35 → F24_t36 (revolve, cut)
    with BuildSketch(Plane(origin=(39.5, -1, 1), x_dir=(-0.7071067812, -0.7071067812, 0), z_dir=(0.7071067812, -0.7071067812, 0))):
        with BuildLine():
            ThreePointArc((0, -1), (1, 0), (0, 1))
            Line((0, 1), (0, -1))
        make_face()
    revolve(axis=Axis((39.5, -1, 1), (0, 0, -1)), mode=Mode.SUBTRACT)


with BuildPart() as f1_4:
    add(f1_3.part)

    # F24_t31: cut F24_tool32
    add(f24_tool32.part, mode=Mode.SUBTRACT)


solid = f1_4.part
